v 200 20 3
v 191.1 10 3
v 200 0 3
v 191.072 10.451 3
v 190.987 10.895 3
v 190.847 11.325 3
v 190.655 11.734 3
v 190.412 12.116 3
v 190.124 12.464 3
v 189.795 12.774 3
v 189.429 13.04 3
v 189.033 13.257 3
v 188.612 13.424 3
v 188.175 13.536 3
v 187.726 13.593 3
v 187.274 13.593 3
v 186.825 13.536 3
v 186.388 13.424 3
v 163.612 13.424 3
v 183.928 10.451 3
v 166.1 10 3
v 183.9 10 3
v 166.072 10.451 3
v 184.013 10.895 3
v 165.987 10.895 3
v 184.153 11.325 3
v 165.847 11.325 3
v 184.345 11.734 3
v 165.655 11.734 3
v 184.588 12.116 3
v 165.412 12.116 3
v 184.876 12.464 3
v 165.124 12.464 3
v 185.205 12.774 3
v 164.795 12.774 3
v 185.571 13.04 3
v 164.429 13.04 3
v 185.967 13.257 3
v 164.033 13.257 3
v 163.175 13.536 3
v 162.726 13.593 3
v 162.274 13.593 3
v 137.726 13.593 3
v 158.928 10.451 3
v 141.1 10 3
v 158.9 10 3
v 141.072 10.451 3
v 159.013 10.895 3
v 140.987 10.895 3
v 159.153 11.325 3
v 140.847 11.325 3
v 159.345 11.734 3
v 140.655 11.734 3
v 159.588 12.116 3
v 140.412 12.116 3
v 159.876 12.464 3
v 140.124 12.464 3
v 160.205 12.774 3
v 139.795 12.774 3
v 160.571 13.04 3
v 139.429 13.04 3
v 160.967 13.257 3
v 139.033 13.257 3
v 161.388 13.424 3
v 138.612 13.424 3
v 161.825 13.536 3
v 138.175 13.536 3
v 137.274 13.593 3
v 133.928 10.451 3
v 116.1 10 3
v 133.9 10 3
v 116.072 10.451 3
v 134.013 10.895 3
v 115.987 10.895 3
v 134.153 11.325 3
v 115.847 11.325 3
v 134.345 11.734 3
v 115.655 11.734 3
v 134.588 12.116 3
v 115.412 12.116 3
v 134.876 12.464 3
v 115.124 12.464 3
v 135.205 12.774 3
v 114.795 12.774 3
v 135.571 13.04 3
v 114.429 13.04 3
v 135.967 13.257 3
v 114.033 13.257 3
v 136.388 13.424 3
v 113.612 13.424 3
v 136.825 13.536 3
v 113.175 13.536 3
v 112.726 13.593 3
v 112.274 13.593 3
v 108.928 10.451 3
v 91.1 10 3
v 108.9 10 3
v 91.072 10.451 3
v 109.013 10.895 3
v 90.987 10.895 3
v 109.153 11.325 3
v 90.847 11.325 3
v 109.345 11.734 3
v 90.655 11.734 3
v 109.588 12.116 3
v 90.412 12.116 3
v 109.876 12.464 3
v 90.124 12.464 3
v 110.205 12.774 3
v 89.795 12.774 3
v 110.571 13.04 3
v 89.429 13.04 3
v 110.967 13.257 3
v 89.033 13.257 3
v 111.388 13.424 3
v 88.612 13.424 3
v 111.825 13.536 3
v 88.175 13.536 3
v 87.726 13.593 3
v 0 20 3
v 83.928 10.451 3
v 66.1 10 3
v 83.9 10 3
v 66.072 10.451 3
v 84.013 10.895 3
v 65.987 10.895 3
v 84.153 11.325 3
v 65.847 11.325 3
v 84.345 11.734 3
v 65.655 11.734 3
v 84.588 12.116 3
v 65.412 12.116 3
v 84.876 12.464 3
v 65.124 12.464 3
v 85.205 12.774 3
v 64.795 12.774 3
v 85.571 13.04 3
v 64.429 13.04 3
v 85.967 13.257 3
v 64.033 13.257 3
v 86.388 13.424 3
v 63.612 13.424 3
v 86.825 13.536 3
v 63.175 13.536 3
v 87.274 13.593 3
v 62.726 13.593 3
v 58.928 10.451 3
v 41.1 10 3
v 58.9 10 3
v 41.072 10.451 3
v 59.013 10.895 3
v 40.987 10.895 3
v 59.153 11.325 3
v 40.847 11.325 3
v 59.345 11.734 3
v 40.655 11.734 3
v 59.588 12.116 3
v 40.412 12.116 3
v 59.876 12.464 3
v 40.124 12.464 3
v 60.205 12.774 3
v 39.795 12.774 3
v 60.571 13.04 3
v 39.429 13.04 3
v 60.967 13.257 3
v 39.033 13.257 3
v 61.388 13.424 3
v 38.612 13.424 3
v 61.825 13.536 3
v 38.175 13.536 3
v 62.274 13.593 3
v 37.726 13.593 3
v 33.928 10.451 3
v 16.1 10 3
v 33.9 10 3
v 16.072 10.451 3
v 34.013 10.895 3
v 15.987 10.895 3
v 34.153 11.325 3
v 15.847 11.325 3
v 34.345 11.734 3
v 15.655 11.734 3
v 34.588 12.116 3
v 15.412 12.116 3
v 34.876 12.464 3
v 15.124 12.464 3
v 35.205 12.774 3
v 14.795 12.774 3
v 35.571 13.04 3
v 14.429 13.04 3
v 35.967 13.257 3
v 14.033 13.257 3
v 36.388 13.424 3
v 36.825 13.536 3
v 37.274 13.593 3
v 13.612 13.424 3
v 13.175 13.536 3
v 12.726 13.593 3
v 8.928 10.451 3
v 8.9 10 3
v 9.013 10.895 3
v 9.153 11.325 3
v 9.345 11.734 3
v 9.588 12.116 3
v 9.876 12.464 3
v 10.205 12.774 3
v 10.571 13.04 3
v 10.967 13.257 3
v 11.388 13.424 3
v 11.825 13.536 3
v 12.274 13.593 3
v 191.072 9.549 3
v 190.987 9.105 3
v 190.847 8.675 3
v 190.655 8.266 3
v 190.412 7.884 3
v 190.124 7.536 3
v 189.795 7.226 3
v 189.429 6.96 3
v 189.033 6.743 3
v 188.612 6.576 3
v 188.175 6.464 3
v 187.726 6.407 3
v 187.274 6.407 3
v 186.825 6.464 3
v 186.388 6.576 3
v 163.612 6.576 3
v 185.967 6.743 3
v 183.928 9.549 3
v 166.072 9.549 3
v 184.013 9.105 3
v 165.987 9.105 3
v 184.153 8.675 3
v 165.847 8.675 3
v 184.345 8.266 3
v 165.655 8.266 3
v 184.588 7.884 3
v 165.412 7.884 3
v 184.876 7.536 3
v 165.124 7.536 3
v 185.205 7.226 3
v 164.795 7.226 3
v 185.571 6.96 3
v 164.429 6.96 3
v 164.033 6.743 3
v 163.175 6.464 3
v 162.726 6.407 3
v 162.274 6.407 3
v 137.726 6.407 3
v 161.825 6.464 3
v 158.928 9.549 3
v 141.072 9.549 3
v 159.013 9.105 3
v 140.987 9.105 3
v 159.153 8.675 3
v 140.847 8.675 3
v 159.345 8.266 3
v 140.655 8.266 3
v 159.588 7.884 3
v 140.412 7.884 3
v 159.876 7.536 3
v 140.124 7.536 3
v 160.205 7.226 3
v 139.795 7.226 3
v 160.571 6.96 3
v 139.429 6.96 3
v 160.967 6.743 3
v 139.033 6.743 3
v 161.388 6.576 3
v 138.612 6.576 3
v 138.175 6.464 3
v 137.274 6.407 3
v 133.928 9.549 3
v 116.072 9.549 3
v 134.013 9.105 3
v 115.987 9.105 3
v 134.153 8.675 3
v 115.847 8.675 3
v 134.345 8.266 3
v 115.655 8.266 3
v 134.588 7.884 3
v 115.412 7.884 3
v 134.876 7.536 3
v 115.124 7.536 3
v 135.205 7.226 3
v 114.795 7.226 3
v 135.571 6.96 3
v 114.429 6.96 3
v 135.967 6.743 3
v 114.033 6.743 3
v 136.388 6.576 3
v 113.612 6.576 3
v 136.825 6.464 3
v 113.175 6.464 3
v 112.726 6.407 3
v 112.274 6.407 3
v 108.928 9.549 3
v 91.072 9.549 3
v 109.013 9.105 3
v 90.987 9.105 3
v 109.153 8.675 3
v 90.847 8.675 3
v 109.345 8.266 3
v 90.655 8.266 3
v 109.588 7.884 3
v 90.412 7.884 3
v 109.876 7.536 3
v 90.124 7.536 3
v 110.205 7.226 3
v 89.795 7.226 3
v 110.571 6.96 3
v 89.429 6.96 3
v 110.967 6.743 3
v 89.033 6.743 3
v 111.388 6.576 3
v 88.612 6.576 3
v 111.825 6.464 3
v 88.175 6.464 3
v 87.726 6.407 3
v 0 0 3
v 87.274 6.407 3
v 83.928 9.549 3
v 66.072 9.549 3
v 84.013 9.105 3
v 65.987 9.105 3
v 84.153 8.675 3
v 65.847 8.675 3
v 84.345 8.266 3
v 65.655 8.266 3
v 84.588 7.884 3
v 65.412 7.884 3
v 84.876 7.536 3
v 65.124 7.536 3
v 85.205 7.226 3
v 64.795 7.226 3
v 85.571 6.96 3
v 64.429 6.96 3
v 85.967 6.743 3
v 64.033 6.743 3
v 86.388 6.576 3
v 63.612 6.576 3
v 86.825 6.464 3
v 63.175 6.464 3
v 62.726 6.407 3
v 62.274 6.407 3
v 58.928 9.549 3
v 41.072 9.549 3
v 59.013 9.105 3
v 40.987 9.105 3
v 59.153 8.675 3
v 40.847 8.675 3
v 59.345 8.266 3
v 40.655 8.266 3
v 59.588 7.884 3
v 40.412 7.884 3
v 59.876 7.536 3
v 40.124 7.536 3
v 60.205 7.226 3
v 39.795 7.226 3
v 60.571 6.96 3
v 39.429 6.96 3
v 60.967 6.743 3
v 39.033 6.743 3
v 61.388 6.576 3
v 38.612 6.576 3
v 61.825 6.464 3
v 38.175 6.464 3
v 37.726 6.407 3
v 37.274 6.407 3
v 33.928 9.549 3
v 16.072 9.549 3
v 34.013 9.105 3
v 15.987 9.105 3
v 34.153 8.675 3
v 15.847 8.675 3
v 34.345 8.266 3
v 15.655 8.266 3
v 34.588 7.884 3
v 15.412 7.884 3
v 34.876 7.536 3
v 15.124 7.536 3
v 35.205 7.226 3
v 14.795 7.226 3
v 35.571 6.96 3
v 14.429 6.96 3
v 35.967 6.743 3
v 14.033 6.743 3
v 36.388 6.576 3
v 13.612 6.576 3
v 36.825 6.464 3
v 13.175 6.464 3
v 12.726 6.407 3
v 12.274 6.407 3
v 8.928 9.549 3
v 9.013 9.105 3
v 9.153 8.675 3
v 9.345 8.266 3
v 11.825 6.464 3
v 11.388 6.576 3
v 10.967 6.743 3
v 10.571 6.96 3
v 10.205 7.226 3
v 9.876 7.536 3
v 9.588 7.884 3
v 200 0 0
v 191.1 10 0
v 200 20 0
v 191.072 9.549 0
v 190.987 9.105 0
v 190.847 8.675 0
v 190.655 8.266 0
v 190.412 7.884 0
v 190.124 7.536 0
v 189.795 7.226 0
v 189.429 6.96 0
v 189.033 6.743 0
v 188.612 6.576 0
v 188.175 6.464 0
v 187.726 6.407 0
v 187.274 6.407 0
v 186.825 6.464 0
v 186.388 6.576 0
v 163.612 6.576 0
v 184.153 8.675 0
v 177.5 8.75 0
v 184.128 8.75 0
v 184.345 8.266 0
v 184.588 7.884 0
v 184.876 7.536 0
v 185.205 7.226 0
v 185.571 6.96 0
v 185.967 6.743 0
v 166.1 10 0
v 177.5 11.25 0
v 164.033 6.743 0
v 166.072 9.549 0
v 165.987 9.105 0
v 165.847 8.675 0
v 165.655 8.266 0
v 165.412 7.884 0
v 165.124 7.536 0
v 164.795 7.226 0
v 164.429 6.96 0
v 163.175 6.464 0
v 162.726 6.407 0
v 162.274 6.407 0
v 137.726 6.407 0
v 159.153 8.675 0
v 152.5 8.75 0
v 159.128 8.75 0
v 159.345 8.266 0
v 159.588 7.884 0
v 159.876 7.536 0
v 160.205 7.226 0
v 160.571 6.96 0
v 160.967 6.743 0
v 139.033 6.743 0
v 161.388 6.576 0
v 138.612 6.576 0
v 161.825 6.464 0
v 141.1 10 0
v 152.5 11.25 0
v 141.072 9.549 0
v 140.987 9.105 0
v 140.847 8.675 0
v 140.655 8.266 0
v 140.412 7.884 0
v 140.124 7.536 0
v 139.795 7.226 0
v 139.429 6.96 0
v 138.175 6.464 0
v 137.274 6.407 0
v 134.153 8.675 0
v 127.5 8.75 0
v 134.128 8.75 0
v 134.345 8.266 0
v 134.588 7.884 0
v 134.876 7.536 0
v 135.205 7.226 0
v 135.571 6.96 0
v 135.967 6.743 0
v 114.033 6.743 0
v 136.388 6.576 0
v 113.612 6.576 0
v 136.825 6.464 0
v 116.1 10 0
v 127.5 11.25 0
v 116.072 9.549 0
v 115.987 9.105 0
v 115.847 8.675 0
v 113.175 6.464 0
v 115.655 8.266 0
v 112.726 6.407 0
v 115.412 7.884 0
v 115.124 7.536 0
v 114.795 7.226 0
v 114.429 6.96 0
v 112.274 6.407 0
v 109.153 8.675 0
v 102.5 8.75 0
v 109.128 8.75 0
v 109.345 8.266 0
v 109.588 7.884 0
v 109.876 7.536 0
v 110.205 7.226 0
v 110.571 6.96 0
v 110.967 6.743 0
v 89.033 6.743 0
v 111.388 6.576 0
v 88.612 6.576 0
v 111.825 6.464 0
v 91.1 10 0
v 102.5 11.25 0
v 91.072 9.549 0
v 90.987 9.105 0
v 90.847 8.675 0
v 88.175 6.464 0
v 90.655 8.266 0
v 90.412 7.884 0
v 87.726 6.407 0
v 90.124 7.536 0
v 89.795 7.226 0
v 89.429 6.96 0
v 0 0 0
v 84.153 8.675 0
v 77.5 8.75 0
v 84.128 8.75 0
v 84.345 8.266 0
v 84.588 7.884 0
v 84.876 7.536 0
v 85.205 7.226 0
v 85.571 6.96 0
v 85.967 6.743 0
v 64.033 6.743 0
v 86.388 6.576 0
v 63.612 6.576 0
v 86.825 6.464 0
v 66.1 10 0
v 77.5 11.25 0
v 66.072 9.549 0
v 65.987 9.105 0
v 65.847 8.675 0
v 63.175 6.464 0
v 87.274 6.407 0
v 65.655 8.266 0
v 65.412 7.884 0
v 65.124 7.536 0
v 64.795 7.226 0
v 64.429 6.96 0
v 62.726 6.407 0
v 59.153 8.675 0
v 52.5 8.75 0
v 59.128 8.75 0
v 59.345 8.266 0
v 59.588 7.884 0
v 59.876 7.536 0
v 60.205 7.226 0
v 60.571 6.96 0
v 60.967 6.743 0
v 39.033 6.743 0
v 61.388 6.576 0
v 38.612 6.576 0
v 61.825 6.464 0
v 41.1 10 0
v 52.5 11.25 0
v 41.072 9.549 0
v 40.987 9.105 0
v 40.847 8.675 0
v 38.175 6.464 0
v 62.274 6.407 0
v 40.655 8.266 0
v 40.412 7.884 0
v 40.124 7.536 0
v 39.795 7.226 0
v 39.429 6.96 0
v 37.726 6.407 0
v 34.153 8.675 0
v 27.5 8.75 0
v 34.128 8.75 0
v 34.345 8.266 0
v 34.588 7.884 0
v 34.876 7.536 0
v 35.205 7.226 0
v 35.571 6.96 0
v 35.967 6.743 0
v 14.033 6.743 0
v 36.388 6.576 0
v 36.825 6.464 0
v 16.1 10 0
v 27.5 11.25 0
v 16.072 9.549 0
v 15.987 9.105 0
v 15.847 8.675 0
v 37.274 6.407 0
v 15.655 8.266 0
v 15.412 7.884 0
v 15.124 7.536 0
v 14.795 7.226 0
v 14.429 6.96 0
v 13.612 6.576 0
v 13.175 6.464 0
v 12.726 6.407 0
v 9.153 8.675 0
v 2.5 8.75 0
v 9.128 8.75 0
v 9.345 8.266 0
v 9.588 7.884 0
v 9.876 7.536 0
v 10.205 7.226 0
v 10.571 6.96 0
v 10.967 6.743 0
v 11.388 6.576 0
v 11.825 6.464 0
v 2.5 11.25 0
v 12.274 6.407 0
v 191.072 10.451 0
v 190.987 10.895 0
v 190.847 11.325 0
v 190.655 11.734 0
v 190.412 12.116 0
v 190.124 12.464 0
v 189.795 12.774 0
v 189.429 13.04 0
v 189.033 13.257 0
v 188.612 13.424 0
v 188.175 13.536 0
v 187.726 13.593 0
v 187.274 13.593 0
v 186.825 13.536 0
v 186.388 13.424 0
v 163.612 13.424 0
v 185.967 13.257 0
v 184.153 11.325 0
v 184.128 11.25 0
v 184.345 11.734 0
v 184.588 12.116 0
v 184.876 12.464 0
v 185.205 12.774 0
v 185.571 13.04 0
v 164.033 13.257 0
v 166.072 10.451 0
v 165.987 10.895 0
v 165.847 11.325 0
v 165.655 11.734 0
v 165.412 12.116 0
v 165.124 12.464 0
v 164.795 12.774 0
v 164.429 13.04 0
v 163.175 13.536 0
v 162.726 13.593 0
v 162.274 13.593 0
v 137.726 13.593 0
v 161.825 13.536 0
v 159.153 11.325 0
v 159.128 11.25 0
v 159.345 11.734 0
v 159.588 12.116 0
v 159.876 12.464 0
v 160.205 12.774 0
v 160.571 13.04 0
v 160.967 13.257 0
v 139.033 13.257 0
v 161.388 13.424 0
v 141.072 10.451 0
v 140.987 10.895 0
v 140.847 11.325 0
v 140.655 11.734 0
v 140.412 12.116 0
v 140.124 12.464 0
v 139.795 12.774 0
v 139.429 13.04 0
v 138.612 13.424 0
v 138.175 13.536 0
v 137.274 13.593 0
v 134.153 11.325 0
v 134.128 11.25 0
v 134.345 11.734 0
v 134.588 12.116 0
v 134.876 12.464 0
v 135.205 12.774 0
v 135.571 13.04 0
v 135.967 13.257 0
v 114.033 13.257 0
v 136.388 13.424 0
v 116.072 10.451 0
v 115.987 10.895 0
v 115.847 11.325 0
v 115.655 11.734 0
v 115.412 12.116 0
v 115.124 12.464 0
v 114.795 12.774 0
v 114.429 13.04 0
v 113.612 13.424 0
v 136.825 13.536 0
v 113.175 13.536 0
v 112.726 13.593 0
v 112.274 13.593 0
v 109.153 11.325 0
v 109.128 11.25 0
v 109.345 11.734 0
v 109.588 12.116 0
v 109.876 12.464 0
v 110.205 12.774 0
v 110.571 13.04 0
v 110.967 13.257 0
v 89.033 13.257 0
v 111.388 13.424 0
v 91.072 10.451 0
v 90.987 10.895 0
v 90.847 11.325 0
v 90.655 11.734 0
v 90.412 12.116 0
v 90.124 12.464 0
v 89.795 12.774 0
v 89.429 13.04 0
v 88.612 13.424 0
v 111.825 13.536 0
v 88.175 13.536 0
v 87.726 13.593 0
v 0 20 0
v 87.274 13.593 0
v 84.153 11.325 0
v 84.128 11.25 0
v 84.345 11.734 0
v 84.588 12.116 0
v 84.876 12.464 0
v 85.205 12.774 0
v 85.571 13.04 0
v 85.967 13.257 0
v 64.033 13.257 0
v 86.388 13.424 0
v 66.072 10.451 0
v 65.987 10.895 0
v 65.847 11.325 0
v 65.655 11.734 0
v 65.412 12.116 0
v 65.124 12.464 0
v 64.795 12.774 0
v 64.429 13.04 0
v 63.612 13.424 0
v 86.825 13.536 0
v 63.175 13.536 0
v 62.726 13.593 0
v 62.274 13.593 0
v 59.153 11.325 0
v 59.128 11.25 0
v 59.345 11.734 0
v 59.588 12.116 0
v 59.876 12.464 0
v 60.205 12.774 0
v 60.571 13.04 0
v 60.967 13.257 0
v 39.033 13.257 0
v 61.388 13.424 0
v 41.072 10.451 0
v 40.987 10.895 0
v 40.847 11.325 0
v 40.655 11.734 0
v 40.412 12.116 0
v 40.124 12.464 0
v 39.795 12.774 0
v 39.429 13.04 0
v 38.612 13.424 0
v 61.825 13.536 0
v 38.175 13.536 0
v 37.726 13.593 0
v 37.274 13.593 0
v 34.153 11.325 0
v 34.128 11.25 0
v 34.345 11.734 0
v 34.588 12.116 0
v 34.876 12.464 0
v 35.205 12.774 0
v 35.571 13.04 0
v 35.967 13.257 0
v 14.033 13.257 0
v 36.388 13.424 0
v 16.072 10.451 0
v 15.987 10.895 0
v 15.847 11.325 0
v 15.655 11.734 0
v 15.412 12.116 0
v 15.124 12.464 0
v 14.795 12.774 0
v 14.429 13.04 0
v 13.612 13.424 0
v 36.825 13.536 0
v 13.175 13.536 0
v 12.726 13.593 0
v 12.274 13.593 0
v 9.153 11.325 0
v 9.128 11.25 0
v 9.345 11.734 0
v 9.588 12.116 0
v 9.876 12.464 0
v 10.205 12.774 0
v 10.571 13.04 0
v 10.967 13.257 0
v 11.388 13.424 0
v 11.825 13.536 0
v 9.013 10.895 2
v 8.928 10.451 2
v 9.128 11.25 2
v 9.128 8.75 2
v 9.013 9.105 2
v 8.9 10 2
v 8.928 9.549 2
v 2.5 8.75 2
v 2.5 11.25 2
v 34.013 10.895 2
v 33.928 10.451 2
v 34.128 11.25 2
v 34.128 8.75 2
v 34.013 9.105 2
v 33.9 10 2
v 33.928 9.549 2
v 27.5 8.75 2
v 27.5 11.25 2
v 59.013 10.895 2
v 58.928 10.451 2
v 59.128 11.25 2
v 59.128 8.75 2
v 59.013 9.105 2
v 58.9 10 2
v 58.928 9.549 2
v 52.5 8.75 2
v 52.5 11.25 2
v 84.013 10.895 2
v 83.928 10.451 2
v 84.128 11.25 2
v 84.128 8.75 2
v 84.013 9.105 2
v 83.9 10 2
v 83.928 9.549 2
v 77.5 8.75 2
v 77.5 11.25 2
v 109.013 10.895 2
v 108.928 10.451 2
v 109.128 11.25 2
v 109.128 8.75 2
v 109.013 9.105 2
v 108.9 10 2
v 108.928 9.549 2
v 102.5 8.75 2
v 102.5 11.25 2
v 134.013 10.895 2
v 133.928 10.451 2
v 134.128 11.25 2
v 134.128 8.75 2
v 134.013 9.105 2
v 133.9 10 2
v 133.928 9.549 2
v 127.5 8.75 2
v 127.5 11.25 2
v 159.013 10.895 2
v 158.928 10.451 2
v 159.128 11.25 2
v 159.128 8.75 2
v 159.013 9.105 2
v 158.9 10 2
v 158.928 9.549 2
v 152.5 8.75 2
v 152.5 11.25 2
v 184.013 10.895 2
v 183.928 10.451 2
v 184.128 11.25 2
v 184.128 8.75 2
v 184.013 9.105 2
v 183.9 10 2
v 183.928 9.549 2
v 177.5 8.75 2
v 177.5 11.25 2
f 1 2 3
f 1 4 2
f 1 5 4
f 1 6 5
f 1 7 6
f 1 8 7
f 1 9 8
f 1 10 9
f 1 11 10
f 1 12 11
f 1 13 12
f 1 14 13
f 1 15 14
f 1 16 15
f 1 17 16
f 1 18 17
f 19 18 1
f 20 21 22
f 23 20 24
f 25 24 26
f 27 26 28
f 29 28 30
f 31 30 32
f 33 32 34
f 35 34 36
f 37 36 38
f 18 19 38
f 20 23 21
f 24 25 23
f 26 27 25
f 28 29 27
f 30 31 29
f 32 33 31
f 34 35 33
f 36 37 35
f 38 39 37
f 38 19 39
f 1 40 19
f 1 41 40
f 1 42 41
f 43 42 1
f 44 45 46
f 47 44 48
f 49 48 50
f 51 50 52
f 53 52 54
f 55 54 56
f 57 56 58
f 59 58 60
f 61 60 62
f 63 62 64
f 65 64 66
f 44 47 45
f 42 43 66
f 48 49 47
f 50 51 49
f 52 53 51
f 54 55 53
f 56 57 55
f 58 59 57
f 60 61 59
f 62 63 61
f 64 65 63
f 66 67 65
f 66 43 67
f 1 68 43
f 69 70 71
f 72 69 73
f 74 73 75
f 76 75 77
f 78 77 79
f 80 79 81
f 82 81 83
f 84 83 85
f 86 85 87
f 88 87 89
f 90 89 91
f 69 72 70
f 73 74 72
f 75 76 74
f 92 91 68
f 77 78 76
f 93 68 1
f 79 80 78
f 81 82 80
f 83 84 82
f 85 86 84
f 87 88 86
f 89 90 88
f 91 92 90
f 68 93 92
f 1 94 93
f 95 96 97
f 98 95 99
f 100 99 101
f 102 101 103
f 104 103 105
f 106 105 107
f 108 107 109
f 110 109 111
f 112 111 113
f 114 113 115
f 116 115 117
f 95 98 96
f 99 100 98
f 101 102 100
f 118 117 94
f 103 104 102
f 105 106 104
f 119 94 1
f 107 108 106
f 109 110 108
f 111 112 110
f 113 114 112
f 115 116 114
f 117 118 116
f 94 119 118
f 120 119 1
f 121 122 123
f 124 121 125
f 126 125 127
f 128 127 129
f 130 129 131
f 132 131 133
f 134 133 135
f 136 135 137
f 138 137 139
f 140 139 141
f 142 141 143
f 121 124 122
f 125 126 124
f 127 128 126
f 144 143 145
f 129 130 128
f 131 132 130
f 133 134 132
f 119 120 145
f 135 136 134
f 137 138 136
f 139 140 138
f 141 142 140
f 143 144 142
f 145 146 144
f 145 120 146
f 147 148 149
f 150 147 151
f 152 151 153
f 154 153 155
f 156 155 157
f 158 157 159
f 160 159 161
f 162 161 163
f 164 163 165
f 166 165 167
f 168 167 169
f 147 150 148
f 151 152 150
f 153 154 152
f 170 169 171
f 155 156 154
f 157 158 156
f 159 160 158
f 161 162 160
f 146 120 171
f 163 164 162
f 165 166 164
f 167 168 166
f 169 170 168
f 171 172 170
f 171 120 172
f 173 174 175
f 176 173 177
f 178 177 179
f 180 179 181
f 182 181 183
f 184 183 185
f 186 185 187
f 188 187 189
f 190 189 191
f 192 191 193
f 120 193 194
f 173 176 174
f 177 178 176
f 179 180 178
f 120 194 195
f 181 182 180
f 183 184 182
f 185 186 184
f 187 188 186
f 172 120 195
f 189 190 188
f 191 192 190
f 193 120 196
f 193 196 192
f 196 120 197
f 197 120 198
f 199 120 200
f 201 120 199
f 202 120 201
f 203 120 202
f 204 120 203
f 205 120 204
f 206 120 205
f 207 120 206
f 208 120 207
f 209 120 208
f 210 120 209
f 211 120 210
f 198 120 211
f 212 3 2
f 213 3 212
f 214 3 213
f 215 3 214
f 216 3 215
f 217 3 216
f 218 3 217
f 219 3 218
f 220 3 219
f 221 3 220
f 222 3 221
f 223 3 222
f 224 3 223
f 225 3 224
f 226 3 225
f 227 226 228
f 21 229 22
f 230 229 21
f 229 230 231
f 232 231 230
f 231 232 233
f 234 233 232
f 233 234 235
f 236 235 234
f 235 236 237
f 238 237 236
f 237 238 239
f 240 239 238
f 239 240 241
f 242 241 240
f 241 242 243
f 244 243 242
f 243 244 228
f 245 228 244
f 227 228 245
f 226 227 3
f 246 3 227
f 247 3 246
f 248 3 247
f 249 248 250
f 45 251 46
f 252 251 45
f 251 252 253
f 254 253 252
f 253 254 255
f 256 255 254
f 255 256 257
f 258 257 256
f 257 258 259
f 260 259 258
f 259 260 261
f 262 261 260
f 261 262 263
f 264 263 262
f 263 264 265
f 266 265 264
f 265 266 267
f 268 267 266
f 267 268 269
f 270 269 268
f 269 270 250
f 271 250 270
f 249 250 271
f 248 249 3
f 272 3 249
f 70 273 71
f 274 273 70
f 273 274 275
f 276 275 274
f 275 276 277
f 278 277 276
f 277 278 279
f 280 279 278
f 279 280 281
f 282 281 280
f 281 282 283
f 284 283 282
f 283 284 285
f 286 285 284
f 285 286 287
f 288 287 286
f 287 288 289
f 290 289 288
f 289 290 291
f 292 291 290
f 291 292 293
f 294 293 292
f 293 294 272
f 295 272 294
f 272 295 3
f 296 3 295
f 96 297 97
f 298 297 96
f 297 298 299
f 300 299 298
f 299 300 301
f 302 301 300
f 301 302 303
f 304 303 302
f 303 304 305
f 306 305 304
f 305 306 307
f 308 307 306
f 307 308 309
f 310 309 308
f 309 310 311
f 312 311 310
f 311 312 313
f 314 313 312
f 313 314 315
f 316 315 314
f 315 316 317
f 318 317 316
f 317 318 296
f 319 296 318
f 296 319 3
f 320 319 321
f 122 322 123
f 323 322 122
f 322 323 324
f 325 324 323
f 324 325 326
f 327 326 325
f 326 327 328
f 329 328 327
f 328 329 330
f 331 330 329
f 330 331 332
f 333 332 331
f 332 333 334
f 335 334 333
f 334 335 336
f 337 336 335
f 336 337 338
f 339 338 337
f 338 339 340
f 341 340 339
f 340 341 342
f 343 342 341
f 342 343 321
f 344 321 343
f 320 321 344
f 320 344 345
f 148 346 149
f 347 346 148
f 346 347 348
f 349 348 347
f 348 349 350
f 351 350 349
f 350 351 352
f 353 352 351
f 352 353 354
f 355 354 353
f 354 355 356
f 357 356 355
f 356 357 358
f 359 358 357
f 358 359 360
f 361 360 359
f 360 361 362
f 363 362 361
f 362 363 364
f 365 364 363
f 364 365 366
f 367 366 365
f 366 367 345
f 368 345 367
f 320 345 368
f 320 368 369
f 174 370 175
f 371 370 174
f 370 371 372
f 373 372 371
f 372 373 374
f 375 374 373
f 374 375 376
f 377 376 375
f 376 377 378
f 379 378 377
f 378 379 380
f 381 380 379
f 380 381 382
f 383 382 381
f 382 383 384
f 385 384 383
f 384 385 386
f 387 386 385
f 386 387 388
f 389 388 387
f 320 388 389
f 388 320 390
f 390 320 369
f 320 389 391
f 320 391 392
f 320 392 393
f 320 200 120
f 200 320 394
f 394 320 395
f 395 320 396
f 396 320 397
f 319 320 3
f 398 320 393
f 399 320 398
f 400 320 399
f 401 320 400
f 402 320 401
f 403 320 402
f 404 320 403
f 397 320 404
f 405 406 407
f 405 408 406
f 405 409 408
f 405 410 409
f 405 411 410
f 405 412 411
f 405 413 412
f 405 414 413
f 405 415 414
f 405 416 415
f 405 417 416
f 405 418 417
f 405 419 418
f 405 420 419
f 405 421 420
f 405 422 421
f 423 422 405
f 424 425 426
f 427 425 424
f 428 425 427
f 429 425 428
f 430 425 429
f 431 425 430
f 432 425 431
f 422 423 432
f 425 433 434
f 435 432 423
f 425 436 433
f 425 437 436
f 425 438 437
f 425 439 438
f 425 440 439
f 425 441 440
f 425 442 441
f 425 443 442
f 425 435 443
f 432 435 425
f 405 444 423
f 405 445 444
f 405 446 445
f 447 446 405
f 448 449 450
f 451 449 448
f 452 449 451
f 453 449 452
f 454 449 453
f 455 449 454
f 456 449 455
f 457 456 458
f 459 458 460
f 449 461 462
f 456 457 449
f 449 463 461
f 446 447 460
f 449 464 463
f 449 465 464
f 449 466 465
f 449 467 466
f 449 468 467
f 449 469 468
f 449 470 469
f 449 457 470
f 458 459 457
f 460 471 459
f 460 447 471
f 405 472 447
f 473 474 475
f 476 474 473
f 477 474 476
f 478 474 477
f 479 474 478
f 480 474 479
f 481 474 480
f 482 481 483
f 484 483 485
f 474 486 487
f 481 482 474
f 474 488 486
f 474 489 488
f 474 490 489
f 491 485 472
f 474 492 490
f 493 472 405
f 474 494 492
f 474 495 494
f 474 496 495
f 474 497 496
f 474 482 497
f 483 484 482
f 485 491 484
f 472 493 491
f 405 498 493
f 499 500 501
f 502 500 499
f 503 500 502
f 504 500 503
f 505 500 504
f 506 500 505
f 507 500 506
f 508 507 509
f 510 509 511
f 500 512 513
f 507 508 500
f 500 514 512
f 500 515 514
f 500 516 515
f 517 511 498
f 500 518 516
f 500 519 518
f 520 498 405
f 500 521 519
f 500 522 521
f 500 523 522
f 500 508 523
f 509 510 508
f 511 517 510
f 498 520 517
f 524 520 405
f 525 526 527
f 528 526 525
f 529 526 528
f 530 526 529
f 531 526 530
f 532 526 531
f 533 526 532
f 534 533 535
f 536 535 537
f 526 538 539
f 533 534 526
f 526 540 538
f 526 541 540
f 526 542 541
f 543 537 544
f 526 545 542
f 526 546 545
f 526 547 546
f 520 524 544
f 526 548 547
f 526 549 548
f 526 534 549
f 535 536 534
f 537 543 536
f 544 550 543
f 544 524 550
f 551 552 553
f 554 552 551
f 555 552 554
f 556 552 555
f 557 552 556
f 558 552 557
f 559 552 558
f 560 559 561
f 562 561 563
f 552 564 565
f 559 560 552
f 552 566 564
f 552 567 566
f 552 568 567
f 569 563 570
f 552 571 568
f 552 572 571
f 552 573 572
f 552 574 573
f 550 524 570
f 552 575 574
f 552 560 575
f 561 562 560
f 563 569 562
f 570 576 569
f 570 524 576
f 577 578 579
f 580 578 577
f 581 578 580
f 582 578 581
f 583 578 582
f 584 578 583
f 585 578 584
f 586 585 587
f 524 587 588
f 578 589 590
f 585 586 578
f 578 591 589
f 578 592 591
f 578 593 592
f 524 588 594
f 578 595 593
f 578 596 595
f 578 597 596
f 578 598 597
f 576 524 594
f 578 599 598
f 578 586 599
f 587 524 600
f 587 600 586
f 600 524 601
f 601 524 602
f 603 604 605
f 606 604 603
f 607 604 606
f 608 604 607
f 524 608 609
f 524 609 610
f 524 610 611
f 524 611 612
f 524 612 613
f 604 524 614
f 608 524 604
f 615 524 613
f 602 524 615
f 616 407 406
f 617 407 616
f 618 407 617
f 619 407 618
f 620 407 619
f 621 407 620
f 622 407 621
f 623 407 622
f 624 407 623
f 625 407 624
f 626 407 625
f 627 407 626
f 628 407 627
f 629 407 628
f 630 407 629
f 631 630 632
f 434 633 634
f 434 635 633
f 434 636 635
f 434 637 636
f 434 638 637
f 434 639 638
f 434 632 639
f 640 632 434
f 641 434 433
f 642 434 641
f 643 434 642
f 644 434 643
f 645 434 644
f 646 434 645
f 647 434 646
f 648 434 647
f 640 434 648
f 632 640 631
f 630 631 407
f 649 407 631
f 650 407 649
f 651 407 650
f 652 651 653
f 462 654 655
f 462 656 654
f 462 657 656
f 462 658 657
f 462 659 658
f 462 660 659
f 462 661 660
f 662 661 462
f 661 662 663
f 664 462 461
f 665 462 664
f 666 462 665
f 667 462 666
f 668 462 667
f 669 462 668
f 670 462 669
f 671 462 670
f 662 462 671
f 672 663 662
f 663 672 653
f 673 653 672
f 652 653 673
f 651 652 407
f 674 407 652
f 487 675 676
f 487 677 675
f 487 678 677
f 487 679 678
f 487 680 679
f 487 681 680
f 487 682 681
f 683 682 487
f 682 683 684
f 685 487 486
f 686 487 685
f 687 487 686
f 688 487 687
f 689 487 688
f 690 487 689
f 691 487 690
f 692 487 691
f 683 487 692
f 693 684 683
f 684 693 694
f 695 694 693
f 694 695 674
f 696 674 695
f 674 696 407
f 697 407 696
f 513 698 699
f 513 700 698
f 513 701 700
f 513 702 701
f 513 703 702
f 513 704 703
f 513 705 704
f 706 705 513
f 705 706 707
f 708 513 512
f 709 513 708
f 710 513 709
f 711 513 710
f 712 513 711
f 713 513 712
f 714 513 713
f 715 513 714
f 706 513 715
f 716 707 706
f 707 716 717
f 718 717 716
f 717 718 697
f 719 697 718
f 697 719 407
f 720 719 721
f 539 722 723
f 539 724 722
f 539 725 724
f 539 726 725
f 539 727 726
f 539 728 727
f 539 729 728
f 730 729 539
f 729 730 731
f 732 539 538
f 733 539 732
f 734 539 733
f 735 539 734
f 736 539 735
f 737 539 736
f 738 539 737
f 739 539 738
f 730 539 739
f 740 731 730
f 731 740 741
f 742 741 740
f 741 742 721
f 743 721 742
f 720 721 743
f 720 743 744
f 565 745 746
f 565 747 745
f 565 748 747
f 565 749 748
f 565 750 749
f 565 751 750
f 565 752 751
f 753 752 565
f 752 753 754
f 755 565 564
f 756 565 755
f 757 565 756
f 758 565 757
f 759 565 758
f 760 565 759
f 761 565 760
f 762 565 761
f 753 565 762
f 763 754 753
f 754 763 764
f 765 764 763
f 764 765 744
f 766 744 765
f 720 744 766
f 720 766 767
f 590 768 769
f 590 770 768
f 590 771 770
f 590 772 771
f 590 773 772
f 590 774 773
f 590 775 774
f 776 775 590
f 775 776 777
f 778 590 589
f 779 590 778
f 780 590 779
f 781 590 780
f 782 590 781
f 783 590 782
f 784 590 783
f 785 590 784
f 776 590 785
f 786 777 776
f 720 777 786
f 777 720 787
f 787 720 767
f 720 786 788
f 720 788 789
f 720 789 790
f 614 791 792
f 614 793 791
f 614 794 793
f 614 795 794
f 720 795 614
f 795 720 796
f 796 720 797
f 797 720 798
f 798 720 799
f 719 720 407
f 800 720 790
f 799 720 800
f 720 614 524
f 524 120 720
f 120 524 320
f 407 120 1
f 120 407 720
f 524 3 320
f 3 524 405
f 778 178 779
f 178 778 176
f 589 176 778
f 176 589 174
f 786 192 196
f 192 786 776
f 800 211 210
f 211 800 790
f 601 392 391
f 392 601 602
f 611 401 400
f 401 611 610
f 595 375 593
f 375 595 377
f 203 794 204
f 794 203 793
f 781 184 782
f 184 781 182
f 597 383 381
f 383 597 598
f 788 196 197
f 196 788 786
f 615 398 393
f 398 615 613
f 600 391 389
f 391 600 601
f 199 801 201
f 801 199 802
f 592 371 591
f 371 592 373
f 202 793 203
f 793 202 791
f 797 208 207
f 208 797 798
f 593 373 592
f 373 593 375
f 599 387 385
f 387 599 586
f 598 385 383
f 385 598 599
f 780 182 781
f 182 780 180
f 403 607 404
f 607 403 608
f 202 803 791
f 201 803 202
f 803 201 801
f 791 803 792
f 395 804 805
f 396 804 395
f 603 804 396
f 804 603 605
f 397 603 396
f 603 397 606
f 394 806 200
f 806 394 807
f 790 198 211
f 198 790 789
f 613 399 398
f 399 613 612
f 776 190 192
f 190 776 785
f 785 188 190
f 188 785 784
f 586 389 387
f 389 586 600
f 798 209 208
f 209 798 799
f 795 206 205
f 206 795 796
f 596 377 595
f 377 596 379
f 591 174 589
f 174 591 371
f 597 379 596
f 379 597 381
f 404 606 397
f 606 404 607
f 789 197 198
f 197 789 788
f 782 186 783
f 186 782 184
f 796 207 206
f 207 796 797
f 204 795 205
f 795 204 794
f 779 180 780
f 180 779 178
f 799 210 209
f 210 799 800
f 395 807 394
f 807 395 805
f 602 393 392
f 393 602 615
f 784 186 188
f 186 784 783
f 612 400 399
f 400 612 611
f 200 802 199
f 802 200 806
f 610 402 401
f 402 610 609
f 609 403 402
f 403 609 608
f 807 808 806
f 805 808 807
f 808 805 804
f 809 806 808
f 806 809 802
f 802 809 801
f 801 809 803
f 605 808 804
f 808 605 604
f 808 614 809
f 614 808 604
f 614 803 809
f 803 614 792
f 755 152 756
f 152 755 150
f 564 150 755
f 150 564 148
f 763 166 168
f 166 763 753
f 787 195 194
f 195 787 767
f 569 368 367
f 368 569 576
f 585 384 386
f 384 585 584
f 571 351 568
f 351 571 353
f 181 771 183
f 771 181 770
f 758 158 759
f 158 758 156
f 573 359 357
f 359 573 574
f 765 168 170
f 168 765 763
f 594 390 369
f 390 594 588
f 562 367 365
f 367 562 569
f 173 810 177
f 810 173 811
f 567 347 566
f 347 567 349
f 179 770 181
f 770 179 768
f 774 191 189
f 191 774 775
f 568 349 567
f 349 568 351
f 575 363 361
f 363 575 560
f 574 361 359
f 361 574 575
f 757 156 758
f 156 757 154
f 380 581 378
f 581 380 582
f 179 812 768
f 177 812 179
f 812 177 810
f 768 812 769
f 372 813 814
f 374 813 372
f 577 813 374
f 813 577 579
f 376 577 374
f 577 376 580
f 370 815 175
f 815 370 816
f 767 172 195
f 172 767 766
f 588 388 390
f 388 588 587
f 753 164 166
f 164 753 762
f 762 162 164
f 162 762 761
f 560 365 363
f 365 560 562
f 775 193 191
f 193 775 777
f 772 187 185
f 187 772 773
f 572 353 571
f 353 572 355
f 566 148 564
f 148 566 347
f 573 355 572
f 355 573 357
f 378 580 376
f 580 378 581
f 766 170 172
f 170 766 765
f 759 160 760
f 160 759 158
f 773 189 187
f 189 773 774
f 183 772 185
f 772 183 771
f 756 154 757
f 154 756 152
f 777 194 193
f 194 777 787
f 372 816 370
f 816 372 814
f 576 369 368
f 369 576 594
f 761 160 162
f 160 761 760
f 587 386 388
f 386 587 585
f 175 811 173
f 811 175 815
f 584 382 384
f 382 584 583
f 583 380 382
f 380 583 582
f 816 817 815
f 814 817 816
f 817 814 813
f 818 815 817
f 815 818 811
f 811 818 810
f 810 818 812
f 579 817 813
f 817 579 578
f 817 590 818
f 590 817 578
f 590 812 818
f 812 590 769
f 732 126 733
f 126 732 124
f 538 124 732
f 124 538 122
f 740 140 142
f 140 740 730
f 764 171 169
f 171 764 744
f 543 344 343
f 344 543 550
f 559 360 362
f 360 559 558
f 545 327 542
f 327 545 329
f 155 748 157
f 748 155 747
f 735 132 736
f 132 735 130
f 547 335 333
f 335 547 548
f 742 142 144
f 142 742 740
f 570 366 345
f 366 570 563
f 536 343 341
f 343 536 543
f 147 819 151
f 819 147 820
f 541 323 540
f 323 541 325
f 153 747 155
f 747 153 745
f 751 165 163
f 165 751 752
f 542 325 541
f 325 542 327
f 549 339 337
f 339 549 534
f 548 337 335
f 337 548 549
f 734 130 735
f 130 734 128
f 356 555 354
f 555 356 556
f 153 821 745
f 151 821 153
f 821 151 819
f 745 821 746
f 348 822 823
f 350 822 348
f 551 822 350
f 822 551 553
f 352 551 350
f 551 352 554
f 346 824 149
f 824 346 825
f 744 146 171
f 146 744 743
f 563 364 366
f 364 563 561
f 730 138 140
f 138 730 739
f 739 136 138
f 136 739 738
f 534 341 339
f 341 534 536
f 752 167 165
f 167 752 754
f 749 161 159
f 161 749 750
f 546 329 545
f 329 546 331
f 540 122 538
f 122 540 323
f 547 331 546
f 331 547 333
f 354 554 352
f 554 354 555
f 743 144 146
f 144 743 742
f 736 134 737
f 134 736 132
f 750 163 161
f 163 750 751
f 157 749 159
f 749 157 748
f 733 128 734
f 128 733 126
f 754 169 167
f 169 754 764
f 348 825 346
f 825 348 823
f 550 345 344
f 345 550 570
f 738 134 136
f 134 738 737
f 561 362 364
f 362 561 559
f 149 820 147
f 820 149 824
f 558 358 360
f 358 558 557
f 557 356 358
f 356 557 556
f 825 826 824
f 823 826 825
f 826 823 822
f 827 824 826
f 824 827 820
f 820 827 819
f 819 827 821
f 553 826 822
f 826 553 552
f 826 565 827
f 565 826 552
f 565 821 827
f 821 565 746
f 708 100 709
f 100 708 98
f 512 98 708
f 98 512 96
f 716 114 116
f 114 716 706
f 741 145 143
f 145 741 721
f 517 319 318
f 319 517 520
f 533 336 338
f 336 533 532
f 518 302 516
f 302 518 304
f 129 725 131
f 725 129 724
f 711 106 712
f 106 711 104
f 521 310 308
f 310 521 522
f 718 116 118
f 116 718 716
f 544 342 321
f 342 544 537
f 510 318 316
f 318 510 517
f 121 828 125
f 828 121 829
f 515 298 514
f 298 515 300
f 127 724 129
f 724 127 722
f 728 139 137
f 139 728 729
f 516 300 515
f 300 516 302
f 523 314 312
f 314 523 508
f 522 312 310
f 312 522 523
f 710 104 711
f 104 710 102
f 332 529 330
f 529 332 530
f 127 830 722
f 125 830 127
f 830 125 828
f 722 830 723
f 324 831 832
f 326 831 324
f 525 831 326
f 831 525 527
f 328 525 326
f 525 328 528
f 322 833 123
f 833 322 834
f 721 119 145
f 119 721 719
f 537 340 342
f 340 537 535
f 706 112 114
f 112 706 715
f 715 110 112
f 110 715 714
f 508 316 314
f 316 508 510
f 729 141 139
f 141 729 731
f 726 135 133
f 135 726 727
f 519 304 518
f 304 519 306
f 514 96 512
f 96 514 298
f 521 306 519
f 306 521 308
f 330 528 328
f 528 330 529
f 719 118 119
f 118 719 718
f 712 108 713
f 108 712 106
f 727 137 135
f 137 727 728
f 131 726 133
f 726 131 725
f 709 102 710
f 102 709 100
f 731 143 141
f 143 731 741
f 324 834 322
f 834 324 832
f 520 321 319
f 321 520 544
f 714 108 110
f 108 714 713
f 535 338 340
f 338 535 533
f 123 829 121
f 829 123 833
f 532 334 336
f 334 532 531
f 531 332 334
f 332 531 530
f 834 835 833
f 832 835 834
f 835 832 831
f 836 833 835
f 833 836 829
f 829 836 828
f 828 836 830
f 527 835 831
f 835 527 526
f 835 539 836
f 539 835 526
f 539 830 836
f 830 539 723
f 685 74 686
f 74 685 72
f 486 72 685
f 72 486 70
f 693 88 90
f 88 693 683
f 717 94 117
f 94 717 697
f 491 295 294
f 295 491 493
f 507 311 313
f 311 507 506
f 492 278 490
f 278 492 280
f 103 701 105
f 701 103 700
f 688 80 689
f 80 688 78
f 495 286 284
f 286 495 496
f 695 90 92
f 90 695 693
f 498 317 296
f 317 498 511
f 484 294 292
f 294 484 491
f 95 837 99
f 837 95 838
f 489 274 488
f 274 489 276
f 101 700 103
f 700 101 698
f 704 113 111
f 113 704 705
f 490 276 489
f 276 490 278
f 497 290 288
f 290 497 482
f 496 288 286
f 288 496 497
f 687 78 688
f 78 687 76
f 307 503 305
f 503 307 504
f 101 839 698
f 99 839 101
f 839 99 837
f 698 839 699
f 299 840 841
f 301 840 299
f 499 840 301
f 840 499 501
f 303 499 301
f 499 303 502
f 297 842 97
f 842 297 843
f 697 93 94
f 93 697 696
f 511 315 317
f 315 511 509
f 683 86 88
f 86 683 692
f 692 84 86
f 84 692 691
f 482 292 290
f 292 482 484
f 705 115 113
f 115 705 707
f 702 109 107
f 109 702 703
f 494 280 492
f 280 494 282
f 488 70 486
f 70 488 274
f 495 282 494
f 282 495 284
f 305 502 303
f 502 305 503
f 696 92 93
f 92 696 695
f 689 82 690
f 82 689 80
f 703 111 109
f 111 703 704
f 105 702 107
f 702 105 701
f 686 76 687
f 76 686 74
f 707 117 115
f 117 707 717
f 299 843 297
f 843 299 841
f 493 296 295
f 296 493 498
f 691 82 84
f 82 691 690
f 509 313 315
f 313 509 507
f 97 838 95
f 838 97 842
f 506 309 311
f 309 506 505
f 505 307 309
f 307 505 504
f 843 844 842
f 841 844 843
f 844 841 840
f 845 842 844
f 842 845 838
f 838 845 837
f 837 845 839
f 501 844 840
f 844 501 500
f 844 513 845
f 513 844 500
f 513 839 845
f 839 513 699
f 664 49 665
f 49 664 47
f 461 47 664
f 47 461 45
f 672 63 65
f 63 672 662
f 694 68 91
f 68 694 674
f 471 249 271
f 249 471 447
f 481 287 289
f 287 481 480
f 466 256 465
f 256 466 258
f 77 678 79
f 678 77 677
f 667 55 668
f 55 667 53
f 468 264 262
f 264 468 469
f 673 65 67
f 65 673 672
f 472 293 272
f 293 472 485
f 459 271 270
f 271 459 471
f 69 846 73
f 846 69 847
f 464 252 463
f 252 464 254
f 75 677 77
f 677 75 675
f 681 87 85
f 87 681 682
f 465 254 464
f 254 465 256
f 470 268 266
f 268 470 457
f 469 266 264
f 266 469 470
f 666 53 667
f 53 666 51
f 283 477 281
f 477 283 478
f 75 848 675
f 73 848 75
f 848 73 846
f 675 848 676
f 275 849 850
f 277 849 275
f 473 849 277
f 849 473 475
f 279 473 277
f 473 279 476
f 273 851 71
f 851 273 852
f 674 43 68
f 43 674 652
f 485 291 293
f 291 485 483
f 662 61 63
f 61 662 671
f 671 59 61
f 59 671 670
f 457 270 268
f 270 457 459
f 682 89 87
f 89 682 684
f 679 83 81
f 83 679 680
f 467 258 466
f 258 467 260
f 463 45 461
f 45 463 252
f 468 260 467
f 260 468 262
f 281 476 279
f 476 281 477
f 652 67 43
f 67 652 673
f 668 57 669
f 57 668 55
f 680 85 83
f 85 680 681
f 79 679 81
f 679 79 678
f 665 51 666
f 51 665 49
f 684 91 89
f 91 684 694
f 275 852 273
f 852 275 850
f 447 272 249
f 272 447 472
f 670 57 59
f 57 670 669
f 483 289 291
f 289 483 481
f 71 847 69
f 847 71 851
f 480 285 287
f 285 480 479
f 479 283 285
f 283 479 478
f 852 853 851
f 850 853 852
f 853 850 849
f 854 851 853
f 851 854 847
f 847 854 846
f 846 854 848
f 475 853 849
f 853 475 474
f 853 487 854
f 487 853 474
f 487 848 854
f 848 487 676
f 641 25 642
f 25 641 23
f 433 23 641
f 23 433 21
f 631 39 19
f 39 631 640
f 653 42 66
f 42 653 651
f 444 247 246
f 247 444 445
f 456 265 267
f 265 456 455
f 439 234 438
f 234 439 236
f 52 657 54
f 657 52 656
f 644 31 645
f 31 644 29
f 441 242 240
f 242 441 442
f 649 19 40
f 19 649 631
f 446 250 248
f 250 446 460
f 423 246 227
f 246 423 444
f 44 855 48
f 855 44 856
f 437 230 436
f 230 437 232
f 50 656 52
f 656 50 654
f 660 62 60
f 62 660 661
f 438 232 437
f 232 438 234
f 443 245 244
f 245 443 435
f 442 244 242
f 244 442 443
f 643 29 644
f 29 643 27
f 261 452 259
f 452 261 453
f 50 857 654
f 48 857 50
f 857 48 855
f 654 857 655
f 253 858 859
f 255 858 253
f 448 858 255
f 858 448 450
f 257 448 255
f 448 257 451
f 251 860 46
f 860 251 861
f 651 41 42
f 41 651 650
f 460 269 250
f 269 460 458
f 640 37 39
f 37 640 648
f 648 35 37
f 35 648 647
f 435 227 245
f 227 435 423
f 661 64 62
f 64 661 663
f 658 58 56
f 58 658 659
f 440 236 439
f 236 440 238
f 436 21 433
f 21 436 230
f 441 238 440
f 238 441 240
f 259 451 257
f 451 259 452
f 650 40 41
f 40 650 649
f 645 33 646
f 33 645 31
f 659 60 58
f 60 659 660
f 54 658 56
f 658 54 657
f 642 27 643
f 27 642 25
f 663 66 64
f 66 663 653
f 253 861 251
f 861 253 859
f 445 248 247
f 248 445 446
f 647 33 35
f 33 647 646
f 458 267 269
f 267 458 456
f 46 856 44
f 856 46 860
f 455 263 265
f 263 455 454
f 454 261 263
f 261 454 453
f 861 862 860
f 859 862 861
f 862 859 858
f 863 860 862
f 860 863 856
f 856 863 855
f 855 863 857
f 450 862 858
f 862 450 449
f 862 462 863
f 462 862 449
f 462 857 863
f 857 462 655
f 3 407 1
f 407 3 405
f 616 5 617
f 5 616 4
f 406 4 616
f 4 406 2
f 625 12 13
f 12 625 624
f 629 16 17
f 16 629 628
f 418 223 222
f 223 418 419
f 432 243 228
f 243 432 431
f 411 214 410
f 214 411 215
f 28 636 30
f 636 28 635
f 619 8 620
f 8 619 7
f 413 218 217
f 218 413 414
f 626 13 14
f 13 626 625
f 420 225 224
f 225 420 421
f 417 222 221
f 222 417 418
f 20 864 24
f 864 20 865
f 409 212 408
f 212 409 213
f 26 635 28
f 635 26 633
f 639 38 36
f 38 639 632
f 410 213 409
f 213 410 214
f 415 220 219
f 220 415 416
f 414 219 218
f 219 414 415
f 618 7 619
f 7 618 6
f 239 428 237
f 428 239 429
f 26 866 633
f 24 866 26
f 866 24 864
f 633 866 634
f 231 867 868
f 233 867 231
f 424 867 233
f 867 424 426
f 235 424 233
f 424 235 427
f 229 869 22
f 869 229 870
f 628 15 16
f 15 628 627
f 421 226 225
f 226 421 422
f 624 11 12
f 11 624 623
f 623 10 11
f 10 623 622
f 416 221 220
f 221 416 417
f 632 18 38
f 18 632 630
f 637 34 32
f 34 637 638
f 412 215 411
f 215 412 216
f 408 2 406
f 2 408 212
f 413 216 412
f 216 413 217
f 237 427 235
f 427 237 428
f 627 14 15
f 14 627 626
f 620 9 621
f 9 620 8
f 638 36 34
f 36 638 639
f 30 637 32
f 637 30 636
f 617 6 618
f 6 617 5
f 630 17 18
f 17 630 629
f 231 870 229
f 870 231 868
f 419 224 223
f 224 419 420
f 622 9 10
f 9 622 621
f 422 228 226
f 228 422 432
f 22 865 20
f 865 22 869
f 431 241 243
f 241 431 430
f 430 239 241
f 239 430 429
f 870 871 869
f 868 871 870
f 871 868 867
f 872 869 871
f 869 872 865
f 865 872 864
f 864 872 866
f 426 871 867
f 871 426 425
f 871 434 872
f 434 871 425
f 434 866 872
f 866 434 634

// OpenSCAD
$fn = 50;

module pot(length, width, height, notch_angles) {
    translate([width / 2, length / 2, height / 2]) {
        difference() {
            hole_radius = 3.6;
            notch_length = 10;
            notch_width = 2.5;
            notch_height = 2;
            
            // surface
            cube([width, length, height], true);
            
            // hole
            cylinder(h = 7, r = hole_radius, center = true);

            // notches
            for (notch_angle = notch_angles) {
                rotate([0, 0, notch_angle]) {
                    translate([notch_width / -2, 0, -height / 2]) {
                        cube([notch_width, notch_length, notch_height]);
                    }
                }
            }
        }
    }
}

rows = 1;
columns = 8;

pot_length = 20;
pot_width = 25;
panel_thickness = 3;

for (i = [0:columns - 1]) {
    for (j = [0:rows - 1]) {
        translate([pot_width * i, pot_length * j, 0])
            pot(pot_length, pot_width, panel_thickness, [90 + (90 * j)]);
    }
}
